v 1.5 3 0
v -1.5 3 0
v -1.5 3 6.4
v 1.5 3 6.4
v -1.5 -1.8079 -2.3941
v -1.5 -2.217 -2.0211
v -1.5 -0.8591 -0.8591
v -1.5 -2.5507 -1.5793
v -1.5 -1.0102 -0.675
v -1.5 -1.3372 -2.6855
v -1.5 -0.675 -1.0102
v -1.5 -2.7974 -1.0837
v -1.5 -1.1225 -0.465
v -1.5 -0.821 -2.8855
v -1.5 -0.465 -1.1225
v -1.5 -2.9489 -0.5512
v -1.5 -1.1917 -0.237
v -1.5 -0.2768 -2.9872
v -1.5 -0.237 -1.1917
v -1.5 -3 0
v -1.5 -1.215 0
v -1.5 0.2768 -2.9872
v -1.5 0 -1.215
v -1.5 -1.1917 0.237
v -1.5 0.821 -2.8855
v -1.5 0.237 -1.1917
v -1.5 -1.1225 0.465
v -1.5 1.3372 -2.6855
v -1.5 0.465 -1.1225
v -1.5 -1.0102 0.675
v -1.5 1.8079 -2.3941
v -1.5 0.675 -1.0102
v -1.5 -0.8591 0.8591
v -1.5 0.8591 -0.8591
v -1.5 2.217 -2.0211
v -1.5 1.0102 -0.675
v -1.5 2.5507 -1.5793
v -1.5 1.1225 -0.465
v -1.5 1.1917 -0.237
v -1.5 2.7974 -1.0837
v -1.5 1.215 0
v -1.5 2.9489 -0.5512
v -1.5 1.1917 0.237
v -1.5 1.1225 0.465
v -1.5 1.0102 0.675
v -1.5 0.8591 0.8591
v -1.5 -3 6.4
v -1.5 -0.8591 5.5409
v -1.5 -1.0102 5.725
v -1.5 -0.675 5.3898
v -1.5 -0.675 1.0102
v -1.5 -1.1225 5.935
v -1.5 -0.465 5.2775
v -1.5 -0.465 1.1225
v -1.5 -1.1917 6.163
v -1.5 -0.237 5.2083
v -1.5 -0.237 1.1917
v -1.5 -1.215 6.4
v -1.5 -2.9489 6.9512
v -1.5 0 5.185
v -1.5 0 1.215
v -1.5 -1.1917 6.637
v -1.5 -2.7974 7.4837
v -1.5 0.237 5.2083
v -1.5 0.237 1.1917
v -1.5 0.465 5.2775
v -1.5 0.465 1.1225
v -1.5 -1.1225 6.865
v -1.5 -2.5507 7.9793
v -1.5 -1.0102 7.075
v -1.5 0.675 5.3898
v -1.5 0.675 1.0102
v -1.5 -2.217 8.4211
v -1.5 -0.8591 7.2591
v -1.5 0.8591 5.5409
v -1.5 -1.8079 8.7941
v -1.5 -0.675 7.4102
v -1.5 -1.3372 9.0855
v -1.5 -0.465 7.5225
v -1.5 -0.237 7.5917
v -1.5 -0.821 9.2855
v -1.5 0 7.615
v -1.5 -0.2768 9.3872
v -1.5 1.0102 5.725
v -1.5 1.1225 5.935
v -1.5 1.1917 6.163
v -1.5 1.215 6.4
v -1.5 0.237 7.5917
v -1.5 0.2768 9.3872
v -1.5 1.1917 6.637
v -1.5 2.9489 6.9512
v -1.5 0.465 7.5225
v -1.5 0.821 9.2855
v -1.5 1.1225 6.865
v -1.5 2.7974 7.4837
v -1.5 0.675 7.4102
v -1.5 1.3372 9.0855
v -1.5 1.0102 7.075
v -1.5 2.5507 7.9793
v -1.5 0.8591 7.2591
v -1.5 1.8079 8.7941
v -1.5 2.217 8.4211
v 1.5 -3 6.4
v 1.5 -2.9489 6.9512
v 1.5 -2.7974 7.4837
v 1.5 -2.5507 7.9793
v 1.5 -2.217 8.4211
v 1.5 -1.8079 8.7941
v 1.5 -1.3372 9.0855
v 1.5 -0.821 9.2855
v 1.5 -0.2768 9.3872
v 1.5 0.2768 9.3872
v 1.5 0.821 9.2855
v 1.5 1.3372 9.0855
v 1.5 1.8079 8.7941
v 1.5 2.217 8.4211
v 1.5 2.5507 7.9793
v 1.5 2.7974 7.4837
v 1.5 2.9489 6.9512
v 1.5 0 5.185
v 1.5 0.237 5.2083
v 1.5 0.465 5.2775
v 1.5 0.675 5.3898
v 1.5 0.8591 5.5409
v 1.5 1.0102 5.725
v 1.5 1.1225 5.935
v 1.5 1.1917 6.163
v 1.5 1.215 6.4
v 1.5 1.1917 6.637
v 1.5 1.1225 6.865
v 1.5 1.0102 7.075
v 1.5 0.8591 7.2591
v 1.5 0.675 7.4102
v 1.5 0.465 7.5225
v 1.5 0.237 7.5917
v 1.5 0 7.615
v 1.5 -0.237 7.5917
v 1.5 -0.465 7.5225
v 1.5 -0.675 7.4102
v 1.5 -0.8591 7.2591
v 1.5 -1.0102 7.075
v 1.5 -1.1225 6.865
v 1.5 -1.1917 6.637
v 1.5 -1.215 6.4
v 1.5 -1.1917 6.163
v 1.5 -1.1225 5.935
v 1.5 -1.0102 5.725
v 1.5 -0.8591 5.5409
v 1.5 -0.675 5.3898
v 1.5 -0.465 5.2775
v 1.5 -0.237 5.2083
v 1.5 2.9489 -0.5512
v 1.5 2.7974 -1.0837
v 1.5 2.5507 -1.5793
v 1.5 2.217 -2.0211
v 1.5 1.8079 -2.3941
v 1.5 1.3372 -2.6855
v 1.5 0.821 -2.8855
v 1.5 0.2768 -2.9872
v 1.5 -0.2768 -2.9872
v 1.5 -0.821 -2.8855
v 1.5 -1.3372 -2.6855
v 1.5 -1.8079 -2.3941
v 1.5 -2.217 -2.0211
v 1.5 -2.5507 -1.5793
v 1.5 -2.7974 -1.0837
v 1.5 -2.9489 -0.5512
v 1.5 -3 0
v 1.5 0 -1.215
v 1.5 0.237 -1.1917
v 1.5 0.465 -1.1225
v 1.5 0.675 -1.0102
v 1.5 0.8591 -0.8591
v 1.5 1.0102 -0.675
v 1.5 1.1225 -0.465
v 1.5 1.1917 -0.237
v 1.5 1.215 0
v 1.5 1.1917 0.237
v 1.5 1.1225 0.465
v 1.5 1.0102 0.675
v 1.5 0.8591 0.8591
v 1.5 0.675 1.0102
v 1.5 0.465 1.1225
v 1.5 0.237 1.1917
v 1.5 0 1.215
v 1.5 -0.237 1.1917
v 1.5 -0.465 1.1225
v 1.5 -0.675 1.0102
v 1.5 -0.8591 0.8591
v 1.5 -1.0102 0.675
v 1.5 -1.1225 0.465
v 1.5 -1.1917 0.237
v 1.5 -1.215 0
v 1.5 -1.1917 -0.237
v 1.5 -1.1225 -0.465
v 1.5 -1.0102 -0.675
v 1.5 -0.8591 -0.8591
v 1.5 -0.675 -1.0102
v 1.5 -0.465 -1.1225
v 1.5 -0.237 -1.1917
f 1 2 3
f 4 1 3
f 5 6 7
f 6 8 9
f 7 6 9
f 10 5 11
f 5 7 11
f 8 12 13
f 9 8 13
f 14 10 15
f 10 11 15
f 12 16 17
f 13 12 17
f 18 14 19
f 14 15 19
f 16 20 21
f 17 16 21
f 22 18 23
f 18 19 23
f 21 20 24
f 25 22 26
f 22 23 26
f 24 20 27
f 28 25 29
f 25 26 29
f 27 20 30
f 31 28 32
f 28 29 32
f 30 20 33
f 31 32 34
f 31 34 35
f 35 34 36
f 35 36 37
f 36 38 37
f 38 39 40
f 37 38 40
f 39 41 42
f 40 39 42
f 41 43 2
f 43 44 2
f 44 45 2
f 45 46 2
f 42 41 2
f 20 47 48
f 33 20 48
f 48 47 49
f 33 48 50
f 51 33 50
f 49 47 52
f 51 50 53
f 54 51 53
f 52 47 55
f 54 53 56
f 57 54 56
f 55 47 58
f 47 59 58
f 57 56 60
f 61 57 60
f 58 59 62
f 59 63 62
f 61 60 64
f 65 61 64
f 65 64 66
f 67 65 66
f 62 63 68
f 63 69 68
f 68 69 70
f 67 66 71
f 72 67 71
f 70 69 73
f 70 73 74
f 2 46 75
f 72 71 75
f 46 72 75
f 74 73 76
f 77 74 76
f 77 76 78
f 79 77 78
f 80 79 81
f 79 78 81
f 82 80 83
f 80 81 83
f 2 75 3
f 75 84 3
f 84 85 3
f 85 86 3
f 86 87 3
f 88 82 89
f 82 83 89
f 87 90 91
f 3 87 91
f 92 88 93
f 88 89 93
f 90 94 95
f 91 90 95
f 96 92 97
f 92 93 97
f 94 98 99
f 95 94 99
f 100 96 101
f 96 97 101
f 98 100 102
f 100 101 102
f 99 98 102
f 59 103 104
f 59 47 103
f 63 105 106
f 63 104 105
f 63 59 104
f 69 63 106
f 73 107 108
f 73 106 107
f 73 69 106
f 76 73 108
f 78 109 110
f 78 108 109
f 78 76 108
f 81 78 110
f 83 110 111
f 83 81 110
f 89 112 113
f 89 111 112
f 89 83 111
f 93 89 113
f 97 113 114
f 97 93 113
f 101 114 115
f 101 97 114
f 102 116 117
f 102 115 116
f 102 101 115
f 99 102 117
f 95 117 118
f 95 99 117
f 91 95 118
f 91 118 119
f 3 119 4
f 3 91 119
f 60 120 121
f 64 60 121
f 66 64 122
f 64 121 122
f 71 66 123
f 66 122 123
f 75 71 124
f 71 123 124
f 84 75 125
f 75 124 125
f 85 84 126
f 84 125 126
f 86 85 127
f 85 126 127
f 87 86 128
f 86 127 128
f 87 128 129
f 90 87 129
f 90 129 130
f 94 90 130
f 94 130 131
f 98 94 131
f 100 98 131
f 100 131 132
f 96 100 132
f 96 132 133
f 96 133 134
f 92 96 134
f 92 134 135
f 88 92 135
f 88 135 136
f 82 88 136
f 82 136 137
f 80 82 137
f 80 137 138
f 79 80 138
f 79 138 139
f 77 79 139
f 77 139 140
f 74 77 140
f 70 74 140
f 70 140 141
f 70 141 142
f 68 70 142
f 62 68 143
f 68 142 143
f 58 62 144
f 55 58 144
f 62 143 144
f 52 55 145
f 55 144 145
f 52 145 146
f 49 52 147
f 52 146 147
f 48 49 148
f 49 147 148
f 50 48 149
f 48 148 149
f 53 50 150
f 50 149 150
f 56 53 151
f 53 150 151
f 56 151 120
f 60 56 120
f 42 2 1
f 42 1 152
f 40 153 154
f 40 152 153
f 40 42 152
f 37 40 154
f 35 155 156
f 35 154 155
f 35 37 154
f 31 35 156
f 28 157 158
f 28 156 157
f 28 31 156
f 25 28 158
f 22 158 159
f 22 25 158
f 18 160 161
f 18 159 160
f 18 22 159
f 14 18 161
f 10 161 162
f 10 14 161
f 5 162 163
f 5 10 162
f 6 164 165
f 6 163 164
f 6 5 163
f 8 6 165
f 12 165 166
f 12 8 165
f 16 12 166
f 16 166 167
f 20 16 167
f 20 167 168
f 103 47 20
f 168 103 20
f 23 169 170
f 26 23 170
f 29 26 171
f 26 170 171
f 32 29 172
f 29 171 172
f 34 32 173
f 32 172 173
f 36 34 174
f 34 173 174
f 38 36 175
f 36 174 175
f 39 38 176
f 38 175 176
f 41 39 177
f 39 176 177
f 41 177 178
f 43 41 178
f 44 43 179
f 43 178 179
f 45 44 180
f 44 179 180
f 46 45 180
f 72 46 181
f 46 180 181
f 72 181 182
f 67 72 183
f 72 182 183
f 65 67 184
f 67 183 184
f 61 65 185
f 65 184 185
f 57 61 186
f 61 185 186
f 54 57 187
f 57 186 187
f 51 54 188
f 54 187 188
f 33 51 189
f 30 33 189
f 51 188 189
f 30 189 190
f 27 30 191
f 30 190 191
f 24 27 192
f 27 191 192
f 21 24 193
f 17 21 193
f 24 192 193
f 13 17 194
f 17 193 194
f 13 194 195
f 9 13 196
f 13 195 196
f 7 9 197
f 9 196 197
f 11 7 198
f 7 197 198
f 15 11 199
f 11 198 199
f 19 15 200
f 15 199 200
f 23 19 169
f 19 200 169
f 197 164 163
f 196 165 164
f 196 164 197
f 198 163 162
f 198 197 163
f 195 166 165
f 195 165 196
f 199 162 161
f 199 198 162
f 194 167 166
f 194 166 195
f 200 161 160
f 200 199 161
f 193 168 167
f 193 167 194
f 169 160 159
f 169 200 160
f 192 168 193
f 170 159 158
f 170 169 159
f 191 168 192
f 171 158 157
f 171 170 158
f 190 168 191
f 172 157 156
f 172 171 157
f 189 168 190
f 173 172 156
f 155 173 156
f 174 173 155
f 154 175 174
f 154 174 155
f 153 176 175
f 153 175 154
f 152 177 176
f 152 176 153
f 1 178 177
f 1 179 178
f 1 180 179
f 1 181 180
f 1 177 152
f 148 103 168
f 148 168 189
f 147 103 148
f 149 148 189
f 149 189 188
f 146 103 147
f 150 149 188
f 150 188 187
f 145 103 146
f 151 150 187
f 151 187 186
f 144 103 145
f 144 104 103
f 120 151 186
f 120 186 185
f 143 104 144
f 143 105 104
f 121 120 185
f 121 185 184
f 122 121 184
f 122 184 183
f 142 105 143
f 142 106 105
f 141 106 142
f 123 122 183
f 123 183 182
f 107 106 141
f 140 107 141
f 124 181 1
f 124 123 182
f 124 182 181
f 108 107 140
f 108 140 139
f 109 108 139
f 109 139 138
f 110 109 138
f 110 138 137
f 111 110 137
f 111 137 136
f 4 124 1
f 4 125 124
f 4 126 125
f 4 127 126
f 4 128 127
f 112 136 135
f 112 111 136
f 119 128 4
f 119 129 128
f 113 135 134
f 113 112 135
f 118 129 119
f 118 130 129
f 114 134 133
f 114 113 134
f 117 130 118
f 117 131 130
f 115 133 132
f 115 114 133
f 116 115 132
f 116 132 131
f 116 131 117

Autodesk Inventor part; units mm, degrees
sketch "Skizze_1" plane through (0, 0, 0) normal (1, 0, 0) x (0, 1, 0)
  arc A0 (3, 6.4) -> (-3, 6.4) centre (0, 6.4) ccw
  line L0 (-3, 6.4) -> (-3, 0)
  arc A1 (-3, 0) -> (3, 0) centre (0, 0) ccw
  line L1 (3, 0) -> (3, 6.4)
extrude "Extrusion1" add sketch "Skizze_1" along normal mid plane 3
sketch "Skizze_2" plane through (0, 0, 0) normal (0, 1, 0) x (-1, 0, 0)
  line L0 (-10, 0) -> (10, 0)
  line L1 (10, 0) -> (10, -1.215)
  line L2 (10, -1.215) -> (-10, -1.215)
  line L3 (-10, -1.215) -> (-10, 0)
  line L4 (-10, 0) -> (10, 0)
revolve "Revolution1" cut sketch "Skizze_2" angle 360 about axis through (10, 0, 0) along (1, 0, 0)
sketch "Skizze_3" plane through (0, 0, 0) normal (0, 1, 0) x (-1, 0, 0)
  line L0 (-10, 6.4) -> (10, 6.4)
  line L1 (10, 6.4) -> (10, 5.185)
  line L2 (10, 5.185) -> (-10, 5.185)
  line L3 (-10, 5.185) -> (-10, 6.4)
  line L4 (-10, 6.4) -> (10, 6.4)
revolve "Revolution2" cut sketch "Skizze_3" angle 360 about axis through (10, 0, 6.4) along (1, 0, 0)
ref_plane "ZS1_XY" through (0, 0, 0) normal (1, 0, 0) x (0, 0, -1)
ref_plane "ZS1_YZ" through (0, 0, 0) normal (0, 0, -1) x (0, 1, 0)
ref_plane "ZS1_ZX" through (0, 0, 0) normal (0, 1, 0) x (1, 0, 0)
ref_plane "ZS2_XY" through (0, 0, 6.4) normal (1, 0, 0) x (0, 0, -1)
ref_plane "ZS2_YZ" through (0, 0, 6.4) normal (0, 0, -1) x (0, 1, 0)
ref_plane "ZS2_ZX" through (0, 0, 6.4) normal (0, 1, 0) x (1, 0, 0)
properties part number "205-S-ZS"
